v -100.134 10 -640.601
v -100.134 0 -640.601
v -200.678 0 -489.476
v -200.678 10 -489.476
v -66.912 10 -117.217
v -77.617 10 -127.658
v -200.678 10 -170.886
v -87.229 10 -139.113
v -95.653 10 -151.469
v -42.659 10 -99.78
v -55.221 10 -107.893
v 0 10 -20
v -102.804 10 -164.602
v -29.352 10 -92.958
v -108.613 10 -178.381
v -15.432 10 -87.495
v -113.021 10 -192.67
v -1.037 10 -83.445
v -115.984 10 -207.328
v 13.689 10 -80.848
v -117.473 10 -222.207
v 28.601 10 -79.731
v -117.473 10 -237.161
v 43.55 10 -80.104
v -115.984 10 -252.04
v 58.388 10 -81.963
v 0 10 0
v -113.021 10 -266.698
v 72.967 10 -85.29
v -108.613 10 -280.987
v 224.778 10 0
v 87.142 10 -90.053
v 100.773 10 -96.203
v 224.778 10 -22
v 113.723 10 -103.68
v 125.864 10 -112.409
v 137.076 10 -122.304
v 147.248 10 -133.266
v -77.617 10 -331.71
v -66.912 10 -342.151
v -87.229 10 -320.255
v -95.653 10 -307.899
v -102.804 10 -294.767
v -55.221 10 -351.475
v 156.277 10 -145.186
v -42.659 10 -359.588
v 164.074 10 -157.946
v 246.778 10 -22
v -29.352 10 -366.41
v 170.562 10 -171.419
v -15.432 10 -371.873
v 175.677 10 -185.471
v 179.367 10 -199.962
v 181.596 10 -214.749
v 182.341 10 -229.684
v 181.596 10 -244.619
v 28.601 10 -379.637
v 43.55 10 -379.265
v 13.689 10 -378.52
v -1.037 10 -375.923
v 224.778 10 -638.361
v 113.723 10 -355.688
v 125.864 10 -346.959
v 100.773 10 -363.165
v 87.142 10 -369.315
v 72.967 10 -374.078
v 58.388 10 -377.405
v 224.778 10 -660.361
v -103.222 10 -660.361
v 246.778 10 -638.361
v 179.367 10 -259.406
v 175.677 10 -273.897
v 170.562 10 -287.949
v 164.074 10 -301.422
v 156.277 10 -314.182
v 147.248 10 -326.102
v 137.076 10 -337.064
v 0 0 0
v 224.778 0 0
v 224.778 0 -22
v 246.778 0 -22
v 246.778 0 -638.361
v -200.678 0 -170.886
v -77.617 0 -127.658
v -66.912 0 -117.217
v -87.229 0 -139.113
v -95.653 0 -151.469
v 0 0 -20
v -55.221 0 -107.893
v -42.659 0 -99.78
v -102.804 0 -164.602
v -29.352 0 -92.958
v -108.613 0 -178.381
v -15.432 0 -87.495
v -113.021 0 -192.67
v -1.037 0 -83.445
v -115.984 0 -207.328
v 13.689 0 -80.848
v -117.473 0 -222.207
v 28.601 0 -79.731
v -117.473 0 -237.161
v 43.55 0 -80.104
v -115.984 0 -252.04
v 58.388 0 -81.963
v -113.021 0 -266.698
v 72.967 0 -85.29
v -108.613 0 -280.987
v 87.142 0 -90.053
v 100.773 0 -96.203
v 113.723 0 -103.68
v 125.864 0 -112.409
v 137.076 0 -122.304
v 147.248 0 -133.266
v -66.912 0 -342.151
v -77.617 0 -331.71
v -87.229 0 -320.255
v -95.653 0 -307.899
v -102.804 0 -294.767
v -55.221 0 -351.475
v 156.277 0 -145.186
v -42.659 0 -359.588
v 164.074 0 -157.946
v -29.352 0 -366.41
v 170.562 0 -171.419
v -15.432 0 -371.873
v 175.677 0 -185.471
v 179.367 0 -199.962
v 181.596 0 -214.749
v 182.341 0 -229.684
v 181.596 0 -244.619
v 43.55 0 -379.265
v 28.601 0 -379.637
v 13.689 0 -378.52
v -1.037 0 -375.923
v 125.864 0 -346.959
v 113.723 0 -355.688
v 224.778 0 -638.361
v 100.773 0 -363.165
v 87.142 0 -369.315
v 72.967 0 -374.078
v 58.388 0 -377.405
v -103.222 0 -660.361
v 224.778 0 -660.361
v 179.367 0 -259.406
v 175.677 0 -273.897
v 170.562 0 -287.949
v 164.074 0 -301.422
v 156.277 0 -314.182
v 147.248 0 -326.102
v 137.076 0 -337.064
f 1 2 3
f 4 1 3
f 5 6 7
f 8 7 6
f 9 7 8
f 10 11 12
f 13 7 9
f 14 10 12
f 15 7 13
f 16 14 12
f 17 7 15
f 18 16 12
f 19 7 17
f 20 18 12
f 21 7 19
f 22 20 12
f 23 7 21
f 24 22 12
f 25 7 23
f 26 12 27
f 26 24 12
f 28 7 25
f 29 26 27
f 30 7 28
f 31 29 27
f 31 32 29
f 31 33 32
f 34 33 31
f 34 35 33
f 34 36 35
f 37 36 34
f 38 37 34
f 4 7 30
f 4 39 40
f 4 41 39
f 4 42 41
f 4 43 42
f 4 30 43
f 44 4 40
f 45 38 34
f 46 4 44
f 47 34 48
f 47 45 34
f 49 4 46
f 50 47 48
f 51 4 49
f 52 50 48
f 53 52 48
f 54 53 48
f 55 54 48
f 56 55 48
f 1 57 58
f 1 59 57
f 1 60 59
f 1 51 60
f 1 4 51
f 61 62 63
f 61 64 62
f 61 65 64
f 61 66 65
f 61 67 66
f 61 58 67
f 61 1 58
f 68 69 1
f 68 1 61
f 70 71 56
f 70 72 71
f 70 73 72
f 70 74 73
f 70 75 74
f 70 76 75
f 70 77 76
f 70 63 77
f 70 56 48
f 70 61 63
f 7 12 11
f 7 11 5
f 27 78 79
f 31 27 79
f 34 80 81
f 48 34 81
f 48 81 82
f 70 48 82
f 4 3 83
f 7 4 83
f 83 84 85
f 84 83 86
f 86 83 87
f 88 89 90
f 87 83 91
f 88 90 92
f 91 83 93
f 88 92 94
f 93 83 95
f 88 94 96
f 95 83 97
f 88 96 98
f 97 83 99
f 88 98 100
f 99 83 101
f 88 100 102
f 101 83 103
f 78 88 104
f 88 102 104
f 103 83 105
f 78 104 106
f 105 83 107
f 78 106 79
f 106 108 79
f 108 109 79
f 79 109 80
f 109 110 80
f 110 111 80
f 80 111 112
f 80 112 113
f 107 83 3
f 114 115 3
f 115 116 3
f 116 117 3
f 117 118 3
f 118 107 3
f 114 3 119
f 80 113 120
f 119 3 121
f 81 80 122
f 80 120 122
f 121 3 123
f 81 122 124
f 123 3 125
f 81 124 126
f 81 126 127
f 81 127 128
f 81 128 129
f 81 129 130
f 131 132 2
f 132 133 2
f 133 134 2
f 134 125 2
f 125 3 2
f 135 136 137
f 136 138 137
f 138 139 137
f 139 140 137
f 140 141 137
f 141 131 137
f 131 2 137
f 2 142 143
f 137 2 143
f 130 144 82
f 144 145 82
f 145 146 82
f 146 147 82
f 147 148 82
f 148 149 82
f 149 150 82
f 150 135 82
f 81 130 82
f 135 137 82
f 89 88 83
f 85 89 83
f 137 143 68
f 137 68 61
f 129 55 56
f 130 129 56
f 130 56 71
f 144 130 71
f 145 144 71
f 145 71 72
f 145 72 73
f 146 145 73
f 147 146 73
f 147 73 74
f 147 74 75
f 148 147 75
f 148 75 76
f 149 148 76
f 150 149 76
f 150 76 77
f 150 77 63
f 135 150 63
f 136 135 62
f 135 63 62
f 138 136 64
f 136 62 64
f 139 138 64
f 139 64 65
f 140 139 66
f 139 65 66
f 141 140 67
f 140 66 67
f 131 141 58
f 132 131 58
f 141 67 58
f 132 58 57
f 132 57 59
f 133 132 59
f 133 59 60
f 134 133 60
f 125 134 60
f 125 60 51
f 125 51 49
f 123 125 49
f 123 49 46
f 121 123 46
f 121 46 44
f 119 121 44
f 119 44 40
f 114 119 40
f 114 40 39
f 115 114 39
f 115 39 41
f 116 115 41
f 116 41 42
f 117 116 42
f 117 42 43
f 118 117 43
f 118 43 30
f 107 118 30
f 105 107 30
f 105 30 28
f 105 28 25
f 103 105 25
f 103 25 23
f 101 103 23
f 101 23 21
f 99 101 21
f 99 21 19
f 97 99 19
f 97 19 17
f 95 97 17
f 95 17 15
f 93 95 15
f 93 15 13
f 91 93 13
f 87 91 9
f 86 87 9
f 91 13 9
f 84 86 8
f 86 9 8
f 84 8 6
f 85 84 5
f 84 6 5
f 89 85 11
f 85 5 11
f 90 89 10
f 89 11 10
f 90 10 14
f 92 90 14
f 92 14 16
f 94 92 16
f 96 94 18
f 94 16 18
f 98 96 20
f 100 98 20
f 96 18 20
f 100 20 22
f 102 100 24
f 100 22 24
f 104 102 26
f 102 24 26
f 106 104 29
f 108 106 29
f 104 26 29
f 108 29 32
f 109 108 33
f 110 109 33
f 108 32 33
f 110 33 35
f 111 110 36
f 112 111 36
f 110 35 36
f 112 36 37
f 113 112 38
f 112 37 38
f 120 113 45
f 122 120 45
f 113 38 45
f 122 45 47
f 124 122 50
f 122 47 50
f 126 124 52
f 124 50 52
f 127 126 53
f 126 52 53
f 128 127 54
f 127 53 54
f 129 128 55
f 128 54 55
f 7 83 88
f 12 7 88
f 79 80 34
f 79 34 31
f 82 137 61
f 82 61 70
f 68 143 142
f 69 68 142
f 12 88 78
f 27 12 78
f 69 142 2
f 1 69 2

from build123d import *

# Parameters (mm, degrees)
BOSS_EXTRUDE2_DEPTH = 10
SKETCH4_W           = 20
SKETCH4_H           = 20
CUT_EXTRUDE1_DEPTH  = 10
SKETCH5_W           = 22
SKETCH5_H           = 22
CUT_EXTRUDE2_DEPTH  = 11
SKETCH6_R           = 150
CUT_EXTRUDE3_DEPTH  = 11


with BuildPart() as part:
    # Sketch1 → Boss-Extrude2 (new body)
    with BuildSketch(Plane(origin=(0, 0, 0), x_dir=(1, 0, 0), z_dir=(0, 1, 0))):
        Polygon((0, 0), (246.777636447, 0), (246.777636447, 660.361240582), (-103.222363553, 660.361240582), (-100.13363069, 640.601186703), (-200.677997122, 489.475620291), (-200.677997122, 330.180620291), (-200.677997122, 170.885620291), (0, 20), align=None)
    extrude(amount=BOSS_EXTRUDE2_DEPTH)

    # Sketch4 → Cut-Extrude1 (cut)
    with BuildSketch(Plane(origin=(0, 10, 0), x_dir=(1, 0, 0), z_dir=(0, 1, 0))):
        with Locations((-10, 348.38)):
            Rectangle(SKETCH4_W, SKETCH4_H)
    extrude(amount=-CUT_EXTRUDE1_DEPTH, mode=Mode.SUBTRACT)

    # Sketch5 → Cut-Extrude2 (cut, through all)
    with BuildSketch(Plane.XZ):
        with Locations((235.777636447, -649.361240582)):
            Rectangle(SKETCH5_W, SKETCH5_H)
        with Locations((235.777636447, -11)):
            Rectangle(SKETCH5_W, SKETCH5_H)
    extrude(amount=-CUT_EXTRUDE2_DEPTH, mode=Mode.SUBTRACT)

    # Sketch6 → Cut-Extrude3 (cut, through all)
    with BuildSketch(Plane(origin=(0, 10, 0), x_dir=(1, 0, 0), z_dir=(0, 1, 0))):
        with Locations((32.340951638, 229.684080555)):
            Circle(SKETCH6_R)
    extrude(amount=-CUT_EXTRUDE3_DEPTH, mode=Mode.SUBTRACT)


solid = part.part
